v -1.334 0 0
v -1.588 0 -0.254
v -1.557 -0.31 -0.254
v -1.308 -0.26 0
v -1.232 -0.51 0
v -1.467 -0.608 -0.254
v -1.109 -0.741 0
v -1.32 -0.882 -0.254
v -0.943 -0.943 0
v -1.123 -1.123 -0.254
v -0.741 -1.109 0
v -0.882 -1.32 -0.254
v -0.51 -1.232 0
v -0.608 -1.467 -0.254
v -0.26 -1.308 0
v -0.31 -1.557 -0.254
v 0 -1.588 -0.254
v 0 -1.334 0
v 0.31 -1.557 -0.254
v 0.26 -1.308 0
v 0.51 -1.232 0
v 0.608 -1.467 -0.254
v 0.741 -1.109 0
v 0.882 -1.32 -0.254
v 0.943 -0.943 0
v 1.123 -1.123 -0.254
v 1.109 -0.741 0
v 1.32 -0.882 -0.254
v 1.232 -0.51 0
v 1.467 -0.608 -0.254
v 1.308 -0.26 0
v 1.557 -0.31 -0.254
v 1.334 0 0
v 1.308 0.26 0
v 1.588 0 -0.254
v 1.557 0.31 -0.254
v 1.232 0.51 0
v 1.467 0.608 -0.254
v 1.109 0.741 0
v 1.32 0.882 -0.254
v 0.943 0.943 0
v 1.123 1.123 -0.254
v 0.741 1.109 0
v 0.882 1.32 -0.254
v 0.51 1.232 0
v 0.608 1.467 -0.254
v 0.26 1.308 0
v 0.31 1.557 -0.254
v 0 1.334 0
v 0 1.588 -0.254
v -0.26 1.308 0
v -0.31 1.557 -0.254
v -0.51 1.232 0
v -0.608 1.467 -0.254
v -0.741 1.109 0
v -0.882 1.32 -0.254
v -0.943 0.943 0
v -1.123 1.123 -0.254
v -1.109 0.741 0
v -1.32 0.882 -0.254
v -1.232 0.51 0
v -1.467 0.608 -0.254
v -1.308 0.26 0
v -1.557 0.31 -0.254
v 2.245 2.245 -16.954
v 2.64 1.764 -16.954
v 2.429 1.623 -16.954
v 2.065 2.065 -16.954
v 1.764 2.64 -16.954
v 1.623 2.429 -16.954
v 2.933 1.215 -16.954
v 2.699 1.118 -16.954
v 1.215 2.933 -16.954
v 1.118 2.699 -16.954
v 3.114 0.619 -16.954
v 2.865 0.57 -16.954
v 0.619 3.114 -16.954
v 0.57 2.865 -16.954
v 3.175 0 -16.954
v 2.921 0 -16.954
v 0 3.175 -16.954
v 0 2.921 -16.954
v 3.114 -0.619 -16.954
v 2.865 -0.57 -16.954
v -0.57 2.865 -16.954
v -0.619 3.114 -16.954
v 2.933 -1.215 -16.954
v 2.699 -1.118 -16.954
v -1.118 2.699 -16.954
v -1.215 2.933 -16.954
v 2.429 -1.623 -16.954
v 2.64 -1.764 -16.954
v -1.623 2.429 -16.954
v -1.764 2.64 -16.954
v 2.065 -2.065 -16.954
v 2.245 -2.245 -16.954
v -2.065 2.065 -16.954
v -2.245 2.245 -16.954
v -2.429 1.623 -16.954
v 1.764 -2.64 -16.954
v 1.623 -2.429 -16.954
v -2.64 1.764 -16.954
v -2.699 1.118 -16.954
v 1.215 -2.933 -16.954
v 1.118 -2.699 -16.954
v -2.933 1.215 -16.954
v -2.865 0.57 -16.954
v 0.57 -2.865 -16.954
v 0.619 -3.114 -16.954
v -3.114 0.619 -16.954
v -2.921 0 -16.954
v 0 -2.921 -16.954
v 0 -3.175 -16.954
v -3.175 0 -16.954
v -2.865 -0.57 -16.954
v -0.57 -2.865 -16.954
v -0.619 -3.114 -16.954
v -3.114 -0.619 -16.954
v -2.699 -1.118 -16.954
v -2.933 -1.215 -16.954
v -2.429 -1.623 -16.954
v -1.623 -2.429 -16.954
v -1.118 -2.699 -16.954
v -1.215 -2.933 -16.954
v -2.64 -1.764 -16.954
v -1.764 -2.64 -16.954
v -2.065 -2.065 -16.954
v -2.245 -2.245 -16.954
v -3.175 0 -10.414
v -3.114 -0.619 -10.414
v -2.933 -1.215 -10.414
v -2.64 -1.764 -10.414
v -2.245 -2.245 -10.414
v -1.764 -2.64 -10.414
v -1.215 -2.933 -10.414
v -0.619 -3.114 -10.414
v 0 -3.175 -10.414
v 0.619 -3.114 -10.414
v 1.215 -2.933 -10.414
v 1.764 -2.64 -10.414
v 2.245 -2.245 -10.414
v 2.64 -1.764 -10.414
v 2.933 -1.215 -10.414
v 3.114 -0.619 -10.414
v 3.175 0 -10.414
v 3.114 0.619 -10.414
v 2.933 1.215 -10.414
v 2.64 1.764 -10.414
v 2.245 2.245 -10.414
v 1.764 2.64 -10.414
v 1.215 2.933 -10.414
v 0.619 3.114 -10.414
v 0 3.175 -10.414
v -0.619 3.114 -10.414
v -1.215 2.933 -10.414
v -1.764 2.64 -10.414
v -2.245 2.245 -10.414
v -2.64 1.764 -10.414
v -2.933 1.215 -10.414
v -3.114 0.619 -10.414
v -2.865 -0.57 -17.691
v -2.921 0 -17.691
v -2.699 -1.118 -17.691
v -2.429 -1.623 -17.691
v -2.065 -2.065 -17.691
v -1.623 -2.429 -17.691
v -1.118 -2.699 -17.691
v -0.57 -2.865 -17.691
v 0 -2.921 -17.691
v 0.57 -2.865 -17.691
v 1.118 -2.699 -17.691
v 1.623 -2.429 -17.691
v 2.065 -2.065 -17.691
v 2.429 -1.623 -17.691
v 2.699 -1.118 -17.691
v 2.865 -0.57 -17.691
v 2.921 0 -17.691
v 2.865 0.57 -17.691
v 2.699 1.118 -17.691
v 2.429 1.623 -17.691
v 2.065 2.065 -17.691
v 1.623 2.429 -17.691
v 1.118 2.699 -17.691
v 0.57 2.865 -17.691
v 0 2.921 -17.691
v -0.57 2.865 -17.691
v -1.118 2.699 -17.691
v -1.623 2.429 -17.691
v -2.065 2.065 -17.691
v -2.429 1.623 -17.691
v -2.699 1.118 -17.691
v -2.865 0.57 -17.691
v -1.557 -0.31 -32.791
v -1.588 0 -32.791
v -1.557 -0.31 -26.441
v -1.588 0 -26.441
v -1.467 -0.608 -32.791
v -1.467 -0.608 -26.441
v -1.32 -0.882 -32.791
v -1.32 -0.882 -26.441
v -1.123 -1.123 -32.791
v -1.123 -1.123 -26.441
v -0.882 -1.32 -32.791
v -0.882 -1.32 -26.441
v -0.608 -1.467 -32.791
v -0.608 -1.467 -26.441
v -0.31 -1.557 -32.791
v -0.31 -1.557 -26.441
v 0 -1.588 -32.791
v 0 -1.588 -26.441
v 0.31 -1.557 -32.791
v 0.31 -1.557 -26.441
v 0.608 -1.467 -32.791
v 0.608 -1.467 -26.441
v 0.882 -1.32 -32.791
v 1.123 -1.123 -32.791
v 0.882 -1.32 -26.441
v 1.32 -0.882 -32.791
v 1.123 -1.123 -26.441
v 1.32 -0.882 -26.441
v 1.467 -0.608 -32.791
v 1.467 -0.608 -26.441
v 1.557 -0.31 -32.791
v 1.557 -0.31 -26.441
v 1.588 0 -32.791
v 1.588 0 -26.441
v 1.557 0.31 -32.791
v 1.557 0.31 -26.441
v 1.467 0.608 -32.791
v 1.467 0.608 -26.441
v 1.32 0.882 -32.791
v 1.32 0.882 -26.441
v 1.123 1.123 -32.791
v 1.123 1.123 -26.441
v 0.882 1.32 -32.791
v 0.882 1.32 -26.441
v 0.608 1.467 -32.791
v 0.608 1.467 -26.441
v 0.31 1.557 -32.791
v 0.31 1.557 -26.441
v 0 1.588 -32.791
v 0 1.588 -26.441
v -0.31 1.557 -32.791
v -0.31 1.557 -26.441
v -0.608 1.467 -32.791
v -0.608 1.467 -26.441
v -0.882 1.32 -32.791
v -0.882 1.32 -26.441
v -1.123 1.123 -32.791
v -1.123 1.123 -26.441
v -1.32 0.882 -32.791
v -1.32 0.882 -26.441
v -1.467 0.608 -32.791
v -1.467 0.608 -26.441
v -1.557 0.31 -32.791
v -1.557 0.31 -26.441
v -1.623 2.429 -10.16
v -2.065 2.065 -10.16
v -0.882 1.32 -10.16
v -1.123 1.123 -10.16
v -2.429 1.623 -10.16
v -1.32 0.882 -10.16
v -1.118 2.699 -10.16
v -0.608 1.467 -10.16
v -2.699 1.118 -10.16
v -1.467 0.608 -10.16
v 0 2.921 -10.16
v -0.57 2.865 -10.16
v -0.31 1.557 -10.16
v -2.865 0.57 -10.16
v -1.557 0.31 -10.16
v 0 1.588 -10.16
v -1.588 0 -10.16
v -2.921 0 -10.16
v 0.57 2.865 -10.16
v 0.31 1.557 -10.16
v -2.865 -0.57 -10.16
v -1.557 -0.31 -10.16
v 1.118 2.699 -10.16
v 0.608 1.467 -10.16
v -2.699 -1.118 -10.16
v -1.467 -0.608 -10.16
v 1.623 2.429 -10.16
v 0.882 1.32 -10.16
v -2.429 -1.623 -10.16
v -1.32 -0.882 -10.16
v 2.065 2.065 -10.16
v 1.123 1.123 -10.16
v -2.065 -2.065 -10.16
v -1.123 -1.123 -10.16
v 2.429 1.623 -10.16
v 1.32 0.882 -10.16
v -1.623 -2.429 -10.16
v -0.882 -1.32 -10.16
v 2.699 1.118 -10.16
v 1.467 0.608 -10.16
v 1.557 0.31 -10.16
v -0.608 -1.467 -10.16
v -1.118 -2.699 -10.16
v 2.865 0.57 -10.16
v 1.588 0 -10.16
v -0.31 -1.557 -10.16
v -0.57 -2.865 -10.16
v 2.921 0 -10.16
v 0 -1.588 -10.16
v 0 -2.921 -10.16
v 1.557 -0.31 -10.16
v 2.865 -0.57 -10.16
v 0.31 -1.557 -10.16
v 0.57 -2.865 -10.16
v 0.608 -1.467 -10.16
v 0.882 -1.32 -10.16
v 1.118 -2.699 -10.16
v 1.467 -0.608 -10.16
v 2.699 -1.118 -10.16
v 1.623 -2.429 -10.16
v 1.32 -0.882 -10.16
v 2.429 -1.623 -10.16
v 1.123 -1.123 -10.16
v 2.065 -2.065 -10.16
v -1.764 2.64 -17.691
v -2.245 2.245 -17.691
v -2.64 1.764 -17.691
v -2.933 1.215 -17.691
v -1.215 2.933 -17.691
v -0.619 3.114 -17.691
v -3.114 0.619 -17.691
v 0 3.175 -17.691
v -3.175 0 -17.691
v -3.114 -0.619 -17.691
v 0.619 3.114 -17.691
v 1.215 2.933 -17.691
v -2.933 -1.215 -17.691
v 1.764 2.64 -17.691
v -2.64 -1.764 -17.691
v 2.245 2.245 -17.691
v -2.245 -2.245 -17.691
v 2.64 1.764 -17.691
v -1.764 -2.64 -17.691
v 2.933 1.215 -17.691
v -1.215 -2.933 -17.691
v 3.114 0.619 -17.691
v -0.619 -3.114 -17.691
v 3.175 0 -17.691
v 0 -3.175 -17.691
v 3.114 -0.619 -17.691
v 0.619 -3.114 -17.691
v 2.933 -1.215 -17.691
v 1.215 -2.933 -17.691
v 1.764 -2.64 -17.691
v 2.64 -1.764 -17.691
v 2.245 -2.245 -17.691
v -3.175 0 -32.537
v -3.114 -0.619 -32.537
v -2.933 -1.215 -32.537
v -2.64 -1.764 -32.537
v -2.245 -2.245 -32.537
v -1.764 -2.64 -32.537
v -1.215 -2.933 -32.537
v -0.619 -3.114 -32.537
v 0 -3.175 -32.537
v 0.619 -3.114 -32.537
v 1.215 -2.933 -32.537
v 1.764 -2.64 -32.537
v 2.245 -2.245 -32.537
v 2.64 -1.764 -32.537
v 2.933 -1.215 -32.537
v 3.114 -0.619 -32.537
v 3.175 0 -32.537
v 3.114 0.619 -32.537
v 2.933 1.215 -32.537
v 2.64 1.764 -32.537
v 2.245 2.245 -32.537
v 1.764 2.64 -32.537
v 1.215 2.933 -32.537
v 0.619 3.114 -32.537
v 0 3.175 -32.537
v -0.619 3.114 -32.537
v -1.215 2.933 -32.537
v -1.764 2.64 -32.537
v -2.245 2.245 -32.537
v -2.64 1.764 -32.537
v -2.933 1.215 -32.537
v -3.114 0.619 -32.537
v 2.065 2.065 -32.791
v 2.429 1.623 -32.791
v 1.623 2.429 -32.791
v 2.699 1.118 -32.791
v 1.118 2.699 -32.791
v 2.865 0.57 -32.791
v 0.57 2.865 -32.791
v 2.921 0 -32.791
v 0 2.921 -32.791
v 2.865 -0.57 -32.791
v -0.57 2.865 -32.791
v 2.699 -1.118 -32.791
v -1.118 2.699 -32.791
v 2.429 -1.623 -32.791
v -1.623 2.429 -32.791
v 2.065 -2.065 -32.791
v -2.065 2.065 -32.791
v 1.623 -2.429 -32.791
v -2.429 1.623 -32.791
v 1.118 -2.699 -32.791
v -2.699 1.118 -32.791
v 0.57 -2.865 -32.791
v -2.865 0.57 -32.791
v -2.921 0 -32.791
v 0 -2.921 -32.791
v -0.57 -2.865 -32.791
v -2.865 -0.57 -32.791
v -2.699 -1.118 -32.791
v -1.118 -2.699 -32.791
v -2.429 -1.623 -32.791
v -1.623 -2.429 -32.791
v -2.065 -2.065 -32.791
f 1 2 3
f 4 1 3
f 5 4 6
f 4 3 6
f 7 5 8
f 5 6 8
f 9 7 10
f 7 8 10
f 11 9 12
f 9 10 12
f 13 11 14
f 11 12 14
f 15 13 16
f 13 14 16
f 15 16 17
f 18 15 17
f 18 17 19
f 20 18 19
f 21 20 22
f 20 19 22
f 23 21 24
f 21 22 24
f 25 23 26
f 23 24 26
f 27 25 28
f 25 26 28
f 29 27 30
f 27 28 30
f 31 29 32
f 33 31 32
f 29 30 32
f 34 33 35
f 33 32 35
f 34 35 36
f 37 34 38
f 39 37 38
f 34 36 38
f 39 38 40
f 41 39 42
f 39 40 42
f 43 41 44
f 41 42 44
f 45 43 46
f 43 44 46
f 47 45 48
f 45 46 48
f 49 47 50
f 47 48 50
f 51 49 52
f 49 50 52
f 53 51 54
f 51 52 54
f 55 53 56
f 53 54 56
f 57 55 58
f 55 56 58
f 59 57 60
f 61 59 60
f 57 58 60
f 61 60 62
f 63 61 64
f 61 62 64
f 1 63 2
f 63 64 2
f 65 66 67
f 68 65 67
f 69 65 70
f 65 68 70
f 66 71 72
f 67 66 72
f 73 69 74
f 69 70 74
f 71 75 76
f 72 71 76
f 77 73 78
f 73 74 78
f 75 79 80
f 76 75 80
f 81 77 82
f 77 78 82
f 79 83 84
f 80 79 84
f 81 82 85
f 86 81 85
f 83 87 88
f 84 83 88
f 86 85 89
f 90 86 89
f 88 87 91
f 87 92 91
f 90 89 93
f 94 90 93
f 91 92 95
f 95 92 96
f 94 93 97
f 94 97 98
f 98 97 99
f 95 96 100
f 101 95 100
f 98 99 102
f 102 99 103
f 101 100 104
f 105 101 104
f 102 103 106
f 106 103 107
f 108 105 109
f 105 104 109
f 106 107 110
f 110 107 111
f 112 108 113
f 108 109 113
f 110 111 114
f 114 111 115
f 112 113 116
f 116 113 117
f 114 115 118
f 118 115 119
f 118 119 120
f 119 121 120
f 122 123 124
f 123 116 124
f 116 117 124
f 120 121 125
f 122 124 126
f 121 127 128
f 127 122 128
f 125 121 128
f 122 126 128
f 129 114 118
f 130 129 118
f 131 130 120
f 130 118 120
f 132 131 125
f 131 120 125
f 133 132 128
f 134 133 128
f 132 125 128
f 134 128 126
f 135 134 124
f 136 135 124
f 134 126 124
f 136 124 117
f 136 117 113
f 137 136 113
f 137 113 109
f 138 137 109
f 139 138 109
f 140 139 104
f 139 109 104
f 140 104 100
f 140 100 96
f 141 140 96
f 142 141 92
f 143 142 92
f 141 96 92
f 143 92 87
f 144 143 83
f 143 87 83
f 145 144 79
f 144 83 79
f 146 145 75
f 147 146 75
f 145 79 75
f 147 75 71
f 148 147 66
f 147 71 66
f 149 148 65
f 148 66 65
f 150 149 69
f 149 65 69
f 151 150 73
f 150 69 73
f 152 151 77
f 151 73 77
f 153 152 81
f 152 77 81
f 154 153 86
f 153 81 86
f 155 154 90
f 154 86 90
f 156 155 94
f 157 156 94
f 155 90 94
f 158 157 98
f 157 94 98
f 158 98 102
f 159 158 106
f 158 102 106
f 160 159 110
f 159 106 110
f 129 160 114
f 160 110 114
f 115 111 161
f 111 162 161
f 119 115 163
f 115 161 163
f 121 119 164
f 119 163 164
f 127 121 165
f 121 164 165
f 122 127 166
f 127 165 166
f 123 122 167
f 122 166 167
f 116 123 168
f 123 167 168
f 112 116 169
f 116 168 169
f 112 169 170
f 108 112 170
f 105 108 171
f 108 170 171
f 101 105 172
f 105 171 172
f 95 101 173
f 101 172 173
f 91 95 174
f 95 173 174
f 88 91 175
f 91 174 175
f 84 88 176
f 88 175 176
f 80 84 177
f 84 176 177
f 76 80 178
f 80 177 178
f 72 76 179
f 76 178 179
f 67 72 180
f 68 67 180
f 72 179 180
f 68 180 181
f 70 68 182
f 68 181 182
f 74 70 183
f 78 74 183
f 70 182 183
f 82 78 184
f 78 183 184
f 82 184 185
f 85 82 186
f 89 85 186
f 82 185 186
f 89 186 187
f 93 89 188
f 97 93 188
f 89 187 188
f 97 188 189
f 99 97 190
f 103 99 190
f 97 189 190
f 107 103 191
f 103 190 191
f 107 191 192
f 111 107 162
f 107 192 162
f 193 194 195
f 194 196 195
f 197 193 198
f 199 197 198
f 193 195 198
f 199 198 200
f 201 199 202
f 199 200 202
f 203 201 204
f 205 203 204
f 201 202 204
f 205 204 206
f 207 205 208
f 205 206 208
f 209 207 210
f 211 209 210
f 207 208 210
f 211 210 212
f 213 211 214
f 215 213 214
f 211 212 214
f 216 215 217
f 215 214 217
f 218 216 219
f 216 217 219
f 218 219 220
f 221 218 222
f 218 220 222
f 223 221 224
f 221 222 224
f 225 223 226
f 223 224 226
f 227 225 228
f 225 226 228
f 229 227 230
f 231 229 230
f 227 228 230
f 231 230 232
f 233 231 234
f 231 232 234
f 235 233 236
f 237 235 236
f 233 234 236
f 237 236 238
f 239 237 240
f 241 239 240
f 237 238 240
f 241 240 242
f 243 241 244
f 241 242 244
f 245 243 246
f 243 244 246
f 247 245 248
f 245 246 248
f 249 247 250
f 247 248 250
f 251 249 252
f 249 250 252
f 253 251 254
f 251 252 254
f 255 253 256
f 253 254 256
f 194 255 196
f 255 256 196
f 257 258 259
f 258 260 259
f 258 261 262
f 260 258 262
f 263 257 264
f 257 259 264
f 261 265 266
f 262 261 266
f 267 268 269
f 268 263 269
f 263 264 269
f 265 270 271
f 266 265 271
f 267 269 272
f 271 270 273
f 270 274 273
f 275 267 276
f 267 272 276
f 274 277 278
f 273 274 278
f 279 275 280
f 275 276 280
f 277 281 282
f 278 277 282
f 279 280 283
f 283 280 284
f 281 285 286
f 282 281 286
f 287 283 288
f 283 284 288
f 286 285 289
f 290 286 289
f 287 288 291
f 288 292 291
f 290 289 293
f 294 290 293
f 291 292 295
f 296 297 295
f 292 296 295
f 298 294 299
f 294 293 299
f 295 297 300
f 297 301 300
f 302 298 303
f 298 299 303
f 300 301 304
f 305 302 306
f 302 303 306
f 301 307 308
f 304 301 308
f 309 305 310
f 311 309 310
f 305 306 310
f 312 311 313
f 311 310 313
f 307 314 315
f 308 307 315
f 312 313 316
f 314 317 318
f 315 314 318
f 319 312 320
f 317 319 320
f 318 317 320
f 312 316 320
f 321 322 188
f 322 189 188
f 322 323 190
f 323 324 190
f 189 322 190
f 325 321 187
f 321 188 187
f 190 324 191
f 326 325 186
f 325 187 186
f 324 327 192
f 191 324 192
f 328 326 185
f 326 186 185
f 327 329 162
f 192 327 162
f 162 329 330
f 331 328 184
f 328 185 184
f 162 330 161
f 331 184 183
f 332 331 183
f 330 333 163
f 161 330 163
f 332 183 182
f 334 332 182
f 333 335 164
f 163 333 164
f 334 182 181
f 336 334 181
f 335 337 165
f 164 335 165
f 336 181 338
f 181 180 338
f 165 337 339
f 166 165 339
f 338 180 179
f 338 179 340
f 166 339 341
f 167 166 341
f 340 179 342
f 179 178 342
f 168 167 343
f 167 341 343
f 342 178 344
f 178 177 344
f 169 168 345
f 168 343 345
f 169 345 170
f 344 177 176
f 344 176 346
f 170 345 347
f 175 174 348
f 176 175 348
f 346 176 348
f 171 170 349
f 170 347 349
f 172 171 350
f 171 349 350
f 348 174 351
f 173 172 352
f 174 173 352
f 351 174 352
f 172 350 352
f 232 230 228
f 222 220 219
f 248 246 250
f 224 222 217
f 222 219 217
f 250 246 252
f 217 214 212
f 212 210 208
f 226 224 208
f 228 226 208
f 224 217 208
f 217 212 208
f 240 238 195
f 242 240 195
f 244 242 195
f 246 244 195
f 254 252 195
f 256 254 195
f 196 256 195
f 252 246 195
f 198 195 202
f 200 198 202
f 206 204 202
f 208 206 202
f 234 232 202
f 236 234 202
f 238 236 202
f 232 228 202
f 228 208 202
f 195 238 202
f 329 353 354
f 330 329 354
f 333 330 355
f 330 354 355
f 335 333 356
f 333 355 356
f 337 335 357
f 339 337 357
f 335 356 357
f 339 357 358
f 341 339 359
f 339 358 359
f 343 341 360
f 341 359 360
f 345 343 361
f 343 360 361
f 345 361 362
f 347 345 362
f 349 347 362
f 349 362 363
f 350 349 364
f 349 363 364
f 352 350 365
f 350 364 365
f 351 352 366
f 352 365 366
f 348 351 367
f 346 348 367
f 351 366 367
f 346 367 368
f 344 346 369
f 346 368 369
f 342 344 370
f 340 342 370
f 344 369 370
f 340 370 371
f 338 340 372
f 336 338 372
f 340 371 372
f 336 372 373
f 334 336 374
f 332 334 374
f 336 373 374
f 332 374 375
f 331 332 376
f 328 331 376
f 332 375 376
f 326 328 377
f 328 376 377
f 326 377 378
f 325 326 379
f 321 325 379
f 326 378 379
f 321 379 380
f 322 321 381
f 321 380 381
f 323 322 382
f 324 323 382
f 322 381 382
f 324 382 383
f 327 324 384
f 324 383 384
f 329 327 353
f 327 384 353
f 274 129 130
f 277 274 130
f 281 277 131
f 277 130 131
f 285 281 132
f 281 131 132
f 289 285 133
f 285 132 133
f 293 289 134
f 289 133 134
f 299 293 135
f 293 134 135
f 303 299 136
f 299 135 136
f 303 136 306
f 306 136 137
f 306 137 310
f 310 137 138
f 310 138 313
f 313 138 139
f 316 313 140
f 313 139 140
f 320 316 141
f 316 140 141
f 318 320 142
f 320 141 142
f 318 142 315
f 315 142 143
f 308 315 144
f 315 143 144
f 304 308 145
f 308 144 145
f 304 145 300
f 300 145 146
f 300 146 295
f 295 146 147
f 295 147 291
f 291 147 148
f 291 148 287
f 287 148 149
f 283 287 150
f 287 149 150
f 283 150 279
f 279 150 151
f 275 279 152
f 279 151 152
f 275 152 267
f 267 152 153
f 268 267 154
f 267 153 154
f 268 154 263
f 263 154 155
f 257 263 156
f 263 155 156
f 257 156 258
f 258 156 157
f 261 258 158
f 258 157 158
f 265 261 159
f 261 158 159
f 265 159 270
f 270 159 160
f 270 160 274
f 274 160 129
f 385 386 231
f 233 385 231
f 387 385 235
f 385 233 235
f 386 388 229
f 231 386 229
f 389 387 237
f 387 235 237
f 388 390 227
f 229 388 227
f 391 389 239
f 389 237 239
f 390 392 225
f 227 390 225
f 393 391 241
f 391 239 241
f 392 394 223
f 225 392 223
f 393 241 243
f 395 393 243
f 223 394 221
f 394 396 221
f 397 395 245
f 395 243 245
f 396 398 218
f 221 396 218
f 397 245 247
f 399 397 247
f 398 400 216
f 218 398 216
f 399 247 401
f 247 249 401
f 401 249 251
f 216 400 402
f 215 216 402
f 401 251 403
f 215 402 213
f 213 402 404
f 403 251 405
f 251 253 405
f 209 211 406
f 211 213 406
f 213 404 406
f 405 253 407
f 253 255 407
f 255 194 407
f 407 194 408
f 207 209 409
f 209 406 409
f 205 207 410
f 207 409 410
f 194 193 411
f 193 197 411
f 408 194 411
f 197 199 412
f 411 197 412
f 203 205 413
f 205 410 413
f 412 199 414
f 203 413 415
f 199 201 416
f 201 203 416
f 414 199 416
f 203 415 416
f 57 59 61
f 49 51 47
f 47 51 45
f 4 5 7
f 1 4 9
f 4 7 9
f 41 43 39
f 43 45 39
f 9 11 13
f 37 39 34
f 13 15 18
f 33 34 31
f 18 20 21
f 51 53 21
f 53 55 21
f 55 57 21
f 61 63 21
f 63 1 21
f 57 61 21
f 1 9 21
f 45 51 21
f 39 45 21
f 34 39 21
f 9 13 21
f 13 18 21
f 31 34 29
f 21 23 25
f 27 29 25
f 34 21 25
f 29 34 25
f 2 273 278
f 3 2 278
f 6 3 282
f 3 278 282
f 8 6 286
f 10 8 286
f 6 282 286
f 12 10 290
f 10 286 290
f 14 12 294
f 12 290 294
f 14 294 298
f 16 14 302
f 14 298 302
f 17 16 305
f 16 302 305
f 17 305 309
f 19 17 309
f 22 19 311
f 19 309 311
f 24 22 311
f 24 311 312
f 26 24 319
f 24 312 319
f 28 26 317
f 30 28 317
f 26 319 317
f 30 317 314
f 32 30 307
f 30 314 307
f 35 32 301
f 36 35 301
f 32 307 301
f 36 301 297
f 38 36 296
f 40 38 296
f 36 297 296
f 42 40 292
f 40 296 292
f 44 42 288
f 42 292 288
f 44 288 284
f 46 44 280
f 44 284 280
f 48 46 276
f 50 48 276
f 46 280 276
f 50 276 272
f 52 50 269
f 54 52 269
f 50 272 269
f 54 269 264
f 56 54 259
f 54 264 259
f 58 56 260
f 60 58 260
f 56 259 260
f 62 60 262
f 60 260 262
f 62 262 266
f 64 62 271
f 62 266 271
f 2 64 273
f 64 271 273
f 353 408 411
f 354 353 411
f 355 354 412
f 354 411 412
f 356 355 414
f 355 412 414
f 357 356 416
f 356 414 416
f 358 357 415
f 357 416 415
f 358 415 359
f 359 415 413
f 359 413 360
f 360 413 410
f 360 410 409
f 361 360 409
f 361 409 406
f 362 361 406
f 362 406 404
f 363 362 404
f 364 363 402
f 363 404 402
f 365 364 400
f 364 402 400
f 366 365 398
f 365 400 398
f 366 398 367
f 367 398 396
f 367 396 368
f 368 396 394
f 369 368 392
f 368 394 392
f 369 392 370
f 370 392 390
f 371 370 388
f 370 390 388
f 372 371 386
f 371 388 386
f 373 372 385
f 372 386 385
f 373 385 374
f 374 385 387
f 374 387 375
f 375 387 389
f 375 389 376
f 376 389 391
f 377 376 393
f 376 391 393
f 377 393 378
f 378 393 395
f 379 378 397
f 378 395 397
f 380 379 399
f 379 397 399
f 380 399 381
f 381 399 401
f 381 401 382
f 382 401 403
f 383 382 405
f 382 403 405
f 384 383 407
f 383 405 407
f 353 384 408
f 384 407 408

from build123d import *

# Parameters (mm, degrees)
CHAMFER1_SIZE = 0.254


with BuildPart() as part:
    # Sketch1 → Revolve1 (revolve)
    with BuildSketch(Plane(origin=(0, 0, 0), x_dir=(0, 0, -1), z_dir=(1, 0, 0)), mode=Mode.PRIVATE) as revolve1_sk:
        Polygon((0, 0), (0, 1.5875), (10.16, 1.5875), (10.16, 3.175), (16.9545, 3.175), (16.9545, 2.921), (17.6911, 2.921), (17.6911, 3.175), (32.7914, 3.175), (32.7914, 1.5875), (26.4414, 1.5875), (26.4414, 0), align=None)
    revolve(revolve1_sk.sketch.rotate(Axis((0, 0, -26.4414), (0, 0, 1)), 90), axis=Axis((0, 0, -26.4414), (0, 0, 1)))

    # Chamfer1
    chamfer1_edges = [part.edges().sort_by_distance(p)[0] for p in [
        (3.175, 0, -10.16),
        (1.5875, 0, 0),
        (3.175, 0, -32.7914),
    ]]
    chamfer(chamfer1_edges, length=CHAMFER1_SIZE)


solid = part.part
